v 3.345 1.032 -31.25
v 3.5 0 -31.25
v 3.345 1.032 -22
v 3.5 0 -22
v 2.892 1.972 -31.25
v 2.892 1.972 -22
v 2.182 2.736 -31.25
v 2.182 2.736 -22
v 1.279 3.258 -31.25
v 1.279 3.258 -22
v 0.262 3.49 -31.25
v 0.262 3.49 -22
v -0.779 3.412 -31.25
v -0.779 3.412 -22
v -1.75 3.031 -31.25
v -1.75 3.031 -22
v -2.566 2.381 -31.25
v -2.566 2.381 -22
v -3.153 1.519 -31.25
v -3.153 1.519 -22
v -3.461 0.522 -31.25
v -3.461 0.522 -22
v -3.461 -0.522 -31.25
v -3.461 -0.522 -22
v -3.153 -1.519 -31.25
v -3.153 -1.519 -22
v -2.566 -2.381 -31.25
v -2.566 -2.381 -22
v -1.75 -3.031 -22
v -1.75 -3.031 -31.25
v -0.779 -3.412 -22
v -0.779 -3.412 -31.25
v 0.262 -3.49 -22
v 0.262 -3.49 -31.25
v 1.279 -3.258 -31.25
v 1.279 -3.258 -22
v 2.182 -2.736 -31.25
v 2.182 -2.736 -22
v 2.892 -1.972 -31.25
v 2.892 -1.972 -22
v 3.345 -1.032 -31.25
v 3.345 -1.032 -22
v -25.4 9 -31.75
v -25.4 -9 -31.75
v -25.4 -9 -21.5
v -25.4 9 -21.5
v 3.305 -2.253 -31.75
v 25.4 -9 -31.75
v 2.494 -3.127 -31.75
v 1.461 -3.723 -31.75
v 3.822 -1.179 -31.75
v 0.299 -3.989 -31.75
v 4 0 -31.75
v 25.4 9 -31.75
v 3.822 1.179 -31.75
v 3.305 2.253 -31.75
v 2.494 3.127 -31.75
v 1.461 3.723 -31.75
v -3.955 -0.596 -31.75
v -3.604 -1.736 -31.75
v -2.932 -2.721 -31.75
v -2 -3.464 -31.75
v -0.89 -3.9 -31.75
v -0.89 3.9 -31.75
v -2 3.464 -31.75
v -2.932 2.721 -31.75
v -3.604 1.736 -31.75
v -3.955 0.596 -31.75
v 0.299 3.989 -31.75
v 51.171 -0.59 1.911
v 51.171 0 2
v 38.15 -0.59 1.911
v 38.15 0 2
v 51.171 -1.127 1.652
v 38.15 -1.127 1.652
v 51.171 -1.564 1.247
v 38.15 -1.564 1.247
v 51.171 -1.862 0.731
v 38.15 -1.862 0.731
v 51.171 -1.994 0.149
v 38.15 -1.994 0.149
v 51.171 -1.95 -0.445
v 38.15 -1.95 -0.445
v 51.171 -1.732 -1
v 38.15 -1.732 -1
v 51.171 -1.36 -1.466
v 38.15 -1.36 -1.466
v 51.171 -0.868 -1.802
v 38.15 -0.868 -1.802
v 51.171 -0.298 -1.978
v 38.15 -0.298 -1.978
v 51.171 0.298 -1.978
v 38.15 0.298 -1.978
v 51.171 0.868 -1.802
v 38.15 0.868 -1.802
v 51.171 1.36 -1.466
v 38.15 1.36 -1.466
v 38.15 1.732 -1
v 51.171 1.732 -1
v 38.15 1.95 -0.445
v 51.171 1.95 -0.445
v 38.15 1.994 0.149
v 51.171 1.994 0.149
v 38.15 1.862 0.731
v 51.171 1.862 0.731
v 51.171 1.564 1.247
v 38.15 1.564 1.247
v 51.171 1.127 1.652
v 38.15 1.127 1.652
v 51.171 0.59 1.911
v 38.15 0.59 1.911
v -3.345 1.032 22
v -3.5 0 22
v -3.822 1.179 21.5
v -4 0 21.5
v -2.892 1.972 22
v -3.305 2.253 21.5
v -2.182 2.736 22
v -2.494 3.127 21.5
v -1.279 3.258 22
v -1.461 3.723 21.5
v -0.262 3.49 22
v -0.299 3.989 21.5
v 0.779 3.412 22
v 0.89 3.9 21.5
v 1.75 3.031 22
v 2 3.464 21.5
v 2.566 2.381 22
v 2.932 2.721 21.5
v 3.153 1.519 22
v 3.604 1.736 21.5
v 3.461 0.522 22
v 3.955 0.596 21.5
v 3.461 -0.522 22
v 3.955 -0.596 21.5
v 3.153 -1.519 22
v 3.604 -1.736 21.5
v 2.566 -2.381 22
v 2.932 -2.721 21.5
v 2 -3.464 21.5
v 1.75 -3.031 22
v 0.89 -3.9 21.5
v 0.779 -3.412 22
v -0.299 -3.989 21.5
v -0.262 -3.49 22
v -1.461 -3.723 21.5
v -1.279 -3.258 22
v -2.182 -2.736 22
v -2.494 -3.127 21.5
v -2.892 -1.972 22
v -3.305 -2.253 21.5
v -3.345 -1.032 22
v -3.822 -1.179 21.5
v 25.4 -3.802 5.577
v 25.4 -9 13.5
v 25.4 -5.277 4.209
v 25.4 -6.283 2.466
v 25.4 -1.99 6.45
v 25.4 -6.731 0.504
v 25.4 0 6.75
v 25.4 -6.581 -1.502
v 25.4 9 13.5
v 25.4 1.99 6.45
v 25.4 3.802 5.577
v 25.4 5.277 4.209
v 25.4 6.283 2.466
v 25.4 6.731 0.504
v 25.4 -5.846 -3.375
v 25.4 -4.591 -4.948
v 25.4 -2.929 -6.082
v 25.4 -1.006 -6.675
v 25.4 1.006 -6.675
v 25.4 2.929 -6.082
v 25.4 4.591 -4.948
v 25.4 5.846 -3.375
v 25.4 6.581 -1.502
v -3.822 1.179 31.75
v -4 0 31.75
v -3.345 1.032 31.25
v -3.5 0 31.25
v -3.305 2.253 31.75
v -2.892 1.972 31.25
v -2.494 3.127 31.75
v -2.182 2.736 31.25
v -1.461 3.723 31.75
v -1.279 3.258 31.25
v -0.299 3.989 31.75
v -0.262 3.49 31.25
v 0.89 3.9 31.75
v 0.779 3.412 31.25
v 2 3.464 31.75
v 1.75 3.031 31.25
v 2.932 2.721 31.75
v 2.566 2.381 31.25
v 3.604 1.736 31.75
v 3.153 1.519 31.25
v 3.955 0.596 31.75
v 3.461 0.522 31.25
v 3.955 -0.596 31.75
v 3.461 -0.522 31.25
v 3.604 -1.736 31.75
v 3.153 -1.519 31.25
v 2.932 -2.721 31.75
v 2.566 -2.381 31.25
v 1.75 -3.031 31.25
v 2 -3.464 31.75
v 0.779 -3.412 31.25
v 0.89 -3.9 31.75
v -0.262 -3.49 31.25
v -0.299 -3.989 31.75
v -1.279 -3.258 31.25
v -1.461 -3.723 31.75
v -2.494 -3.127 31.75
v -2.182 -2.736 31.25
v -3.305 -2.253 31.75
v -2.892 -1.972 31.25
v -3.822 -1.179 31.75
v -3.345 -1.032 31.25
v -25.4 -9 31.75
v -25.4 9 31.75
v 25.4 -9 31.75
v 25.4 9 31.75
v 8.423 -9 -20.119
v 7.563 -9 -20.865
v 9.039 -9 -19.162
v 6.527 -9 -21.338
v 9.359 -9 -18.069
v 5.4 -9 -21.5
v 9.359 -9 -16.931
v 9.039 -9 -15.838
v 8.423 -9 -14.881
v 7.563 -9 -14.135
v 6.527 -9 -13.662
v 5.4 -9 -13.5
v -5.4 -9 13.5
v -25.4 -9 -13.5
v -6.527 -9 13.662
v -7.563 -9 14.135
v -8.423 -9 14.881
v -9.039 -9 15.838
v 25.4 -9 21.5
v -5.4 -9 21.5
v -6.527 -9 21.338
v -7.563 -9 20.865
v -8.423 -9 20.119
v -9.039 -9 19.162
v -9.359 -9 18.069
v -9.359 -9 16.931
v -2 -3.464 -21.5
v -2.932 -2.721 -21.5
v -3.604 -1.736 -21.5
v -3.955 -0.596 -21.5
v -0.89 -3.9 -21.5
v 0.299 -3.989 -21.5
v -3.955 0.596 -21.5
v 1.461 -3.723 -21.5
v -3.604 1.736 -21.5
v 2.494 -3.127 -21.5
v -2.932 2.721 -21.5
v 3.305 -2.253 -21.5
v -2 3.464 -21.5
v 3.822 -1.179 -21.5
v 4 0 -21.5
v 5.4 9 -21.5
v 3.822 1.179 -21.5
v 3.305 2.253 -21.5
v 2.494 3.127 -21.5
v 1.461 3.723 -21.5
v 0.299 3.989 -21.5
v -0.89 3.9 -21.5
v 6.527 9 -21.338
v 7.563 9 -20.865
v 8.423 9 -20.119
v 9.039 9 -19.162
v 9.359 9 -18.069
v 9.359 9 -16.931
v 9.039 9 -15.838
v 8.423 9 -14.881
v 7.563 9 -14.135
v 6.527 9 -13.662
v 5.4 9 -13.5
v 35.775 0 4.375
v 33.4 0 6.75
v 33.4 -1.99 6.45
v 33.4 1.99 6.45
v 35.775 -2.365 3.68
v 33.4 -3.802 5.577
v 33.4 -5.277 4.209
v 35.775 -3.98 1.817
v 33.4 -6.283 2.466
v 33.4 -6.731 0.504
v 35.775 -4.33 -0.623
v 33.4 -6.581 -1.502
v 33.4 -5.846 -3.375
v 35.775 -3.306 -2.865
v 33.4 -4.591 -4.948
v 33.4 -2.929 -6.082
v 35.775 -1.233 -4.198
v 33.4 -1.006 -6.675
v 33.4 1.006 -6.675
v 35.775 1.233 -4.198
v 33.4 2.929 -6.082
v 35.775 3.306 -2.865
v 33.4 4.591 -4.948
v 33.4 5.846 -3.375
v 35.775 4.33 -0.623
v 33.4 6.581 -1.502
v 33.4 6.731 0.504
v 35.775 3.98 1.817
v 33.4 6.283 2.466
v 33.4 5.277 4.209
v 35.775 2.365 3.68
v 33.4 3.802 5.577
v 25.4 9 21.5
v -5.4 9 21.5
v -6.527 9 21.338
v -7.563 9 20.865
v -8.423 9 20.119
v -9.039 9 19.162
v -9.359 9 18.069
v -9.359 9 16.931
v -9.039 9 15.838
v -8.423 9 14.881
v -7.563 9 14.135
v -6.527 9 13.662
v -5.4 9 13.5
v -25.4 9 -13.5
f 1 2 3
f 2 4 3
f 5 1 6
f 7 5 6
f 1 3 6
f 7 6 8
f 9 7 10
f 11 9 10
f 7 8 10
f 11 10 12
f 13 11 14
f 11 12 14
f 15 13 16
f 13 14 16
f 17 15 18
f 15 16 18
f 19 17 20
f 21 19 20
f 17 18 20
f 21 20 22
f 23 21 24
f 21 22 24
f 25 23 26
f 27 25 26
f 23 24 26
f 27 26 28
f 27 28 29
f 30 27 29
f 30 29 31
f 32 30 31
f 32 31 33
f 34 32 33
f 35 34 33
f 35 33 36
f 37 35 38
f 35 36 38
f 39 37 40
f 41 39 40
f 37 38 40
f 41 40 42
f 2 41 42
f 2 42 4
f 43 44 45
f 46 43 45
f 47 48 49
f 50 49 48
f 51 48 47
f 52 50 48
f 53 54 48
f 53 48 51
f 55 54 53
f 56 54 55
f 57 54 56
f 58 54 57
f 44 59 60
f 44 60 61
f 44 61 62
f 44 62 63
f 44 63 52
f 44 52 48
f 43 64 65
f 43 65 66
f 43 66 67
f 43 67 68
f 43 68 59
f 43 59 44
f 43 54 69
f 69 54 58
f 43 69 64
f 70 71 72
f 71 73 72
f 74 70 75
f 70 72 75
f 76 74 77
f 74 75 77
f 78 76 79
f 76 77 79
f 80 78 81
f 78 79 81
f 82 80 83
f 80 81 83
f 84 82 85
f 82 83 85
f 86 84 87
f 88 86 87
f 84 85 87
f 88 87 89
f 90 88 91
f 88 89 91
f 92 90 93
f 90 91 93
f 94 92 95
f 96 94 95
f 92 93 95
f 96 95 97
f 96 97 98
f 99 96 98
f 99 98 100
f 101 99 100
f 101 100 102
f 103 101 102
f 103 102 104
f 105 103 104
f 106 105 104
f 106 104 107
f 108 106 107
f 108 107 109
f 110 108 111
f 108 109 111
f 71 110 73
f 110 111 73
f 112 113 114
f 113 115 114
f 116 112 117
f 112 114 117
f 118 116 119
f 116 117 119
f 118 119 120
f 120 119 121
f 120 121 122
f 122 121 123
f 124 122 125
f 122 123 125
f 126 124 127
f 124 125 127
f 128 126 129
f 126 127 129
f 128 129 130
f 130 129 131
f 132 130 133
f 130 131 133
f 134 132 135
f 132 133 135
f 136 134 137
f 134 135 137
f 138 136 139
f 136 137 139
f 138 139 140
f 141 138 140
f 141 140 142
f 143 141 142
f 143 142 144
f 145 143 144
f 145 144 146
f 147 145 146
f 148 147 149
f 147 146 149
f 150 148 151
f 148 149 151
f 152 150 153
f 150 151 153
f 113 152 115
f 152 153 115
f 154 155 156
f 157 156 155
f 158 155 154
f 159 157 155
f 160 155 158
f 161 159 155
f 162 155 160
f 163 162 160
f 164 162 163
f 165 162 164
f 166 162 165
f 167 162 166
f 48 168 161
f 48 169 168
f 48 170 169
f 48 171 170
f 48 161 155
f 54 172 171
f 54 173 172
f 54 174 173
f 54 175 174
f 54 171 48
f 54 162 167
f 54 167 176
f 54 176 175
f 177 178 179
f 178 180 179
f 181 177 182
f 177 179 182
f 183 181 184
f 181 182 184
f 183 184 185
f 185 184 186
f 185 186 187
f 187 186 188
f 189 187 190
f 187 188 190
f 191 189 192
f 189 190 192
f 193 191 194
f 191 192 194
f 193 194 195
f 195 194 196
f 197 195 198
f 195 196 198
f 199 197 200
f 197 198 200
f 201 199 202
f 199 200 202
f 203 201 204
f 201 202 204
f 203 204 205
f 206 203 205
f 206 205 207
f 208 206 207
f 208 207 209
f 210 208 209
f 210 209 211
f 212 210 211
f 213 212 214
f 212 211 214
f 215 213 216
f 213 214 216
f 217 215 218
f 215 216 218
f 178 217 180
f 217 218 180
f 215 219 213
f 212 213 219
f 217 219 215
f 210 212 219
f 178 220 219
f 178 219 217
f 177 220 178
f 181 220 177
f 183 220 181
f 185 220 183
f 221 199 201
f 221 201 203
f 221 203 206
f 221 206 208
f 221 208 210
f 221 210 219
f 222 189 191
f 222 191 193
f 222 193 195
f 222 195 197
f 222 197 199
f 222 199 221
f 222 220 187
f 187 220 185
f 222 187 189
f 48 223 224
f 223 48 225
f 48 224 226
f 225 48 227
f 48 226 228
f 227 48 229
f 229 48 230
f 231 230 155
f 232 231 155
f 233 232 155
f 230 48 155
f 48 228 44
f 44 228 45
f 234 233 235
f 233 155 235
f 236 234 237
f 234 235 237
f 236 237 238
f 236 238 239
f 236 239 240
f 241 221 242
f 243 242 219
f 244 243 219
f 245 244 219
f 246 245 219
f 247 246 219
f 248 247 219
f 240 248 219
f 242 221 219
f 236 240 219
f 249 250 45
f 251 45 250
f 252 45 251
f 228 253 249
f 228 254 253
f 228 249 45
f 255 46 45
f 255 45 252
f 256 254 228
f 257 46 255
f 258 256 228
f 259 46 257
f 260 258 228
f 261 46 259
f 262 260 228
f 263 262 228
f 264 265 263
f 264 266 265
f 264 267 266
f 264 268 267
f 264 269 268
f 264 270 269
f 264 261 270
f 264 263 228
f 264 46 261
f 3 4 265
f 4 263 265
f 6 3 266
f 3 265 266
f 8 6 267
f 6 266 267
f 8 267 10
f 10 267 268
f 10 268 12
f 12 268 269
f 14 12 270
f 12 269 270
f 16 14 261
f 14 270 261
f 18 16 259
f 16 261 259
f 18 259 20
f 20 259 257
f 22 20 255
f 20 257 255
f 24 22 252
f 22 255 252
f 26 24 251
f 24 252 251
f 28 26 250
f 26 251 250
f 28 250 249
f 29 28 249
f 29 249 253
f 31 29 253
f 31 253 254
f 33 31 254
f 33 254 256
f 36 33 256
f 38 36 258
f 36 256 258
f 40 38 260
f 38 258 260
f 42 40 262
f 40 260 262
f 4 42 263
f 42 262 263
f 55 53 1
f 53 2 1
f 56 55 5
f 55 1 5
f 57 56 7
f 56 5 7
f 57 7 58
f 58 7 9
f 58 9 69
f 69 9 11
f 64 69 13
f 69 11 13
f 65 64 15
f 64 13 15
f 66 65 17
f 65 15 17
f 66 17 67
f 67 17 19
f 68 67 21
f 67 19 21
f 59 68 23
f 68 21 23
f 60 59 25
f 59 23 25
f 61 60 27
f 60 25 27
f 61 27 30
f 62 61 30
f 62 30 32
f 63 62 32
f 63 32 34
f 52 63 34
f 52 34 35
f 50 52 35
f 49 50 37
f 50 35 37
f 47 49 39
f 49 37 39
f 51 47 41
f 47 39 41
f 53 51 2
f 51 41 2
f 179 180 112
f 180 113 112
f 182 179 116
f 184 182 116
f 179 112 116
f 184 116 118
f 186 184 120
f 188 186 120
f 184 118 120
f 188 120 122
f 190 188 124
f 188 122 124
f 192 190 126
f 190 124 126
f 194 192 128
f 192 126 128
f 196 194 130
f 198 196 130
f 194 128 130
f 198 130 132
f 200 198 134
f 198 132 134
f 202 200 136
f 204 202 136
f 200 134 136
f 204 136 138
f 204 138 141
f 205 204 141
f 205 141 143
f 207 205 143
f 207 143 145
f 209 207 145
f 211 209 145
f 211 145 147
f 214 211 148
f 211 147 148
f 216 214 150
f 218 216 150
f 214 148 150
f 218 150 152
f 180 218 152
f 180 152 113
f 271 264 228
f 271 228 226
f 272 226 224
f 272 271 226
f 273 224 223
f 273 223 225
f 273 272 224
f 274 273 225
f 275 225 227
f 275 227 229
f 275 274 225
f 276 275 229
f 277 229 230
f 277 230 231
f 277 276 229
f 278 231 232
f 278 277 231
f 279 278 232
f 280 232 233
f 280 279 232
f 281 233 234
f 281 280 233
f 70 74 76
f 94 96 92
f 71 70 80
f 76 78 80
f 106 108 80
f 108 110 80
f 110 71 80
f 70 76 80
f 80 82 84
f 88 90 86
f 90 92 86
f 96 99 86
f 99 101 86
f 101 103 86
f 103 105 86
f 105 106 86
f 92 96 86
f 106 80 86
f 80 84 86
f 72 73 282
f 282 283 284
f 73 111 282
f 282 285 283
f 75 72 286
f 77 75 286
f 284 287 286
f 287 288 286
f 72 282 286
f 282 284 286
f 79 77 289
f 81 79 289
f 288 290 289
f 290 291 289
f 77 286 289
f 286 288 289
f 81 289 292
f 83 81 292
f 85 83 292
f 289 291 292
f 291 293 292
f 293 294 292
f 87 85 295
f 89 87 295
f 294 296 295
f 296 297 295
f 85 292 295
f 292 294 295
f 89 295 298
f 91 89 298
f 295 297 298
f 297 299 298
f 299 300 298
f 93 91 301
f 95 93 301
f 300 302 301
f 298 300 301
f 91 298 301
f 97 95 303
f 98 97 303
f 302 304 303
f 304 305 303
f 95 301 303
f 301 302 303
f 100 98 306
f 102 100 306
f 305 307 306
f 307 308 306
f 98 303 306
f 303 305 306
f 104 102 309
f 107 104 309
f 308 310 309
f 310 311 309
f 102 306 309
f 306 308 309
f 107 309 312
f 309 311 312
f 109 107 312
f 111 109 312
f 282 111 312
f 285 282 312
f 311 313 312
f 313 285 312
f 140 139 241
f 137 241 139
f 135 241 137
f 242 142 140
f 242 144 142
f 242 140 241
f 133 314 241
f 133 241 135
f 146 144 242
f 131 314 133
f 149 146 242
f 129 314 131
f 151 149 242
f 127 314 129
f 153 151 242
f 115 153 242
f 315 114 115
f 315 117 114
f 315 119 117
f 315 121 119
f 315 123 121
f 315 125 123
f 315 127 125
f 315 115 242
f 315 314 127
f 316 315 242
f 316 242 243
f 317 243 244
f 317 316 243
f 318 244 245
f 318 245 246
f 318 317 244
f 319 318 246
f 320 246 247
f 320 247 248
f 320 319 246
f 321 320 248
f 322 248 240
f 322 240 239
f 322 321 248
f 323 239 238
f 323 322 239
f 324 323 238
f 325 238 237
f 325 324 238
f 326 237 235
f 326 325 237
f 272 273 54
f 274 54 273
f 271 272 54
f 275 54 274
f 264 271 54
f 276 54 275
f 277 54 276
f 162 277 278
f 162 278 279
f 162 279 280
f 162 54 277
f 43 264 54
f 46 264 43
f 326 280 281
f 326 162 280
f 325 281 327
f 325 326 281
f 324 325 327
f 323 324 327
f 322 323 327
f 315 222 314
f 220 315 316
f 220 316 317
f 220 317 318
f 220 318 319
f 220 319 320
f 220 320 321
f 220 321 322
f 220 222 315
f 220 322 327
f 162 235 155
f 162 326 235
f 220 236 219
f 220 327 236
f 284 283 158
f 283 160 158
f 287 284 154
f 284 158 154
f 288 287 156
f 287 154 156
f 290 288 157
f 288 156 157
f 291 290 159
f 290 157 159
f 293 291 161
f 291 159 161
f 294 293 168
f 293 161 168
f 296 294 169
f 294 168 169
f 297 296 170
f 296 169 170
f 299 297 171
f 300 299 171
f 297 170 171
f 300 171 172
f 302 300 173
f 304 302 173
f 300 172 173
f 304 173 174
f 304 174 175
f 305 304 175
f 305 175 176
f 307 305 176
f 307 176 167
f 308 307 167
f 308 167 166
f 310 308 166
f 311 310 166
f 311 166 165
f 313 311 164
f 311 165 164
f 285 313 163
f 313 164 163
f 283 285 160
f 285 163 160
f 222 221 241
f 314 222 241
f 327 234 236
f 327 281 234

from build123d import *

# Parameters (mm, degrees)
BOSS_EXTRUDE1_DEPTH = 9
CIRPATTERN1_COUNT   = 2


# Read off the part's stored shape, not the designer's step: M8x1.0 Tapped Hole1
with BuildPart() as part:
    # Sketch1 → Boss-Extrude1 (new, symmetric)
    with BuildSketch(Plane(origin=(0, 0, 0), x_dir=(1, 0, 0), z_dir=(0, 1, 0))):
        with BuildLine():
            Line((-25.4, 0), (25.4, 0))
            Line((25.4, 0), (25.4, 31.75))
            Line((25.4, 31.75), (-25.4, 31.75))
            Line((-25.4, 31.75), (-25.4, 21.5))
            Line((-25.4, 21.5), (5.4, 21.5))
            ThreePointArc((5.4, 21.5), (9.4, 17.5), (5.4, 13.5))
            Line((5.4, 13.5), (-25.4, 13.5))
            Line((-25.4, 13.5), (-25.4, 0))
        make_face()
    boss_extrude1 = extrude(amount=BOSS_EXTRUDE1_DEPTH, both=True)

    # M8x1.0 Tapped Hole1 outline → M8x1.0 Tapped Hole1 (revolve, cut)
    with BuildSketch(Plane.XZ):
        Polygon((4, -21.5), (0, -21.5), (0, -31.75), (4, -31.75), (3.5, -31.25), (3.5, -22), align=None)
    m8x1_0_tapped_hole1 = revolve(axis=Axis((0, 0, 0), (0, 0, 1)), mode=Mode.SUBTRACT)

    # CirPattern1: Boss-Extrude1, M8x1.0 Tapped Hole1 ×2 about axis
    cirpattern1_axis = Axis((0, 0, 0), (0, 1, 0))
    add([boss_extrude1.rotate(cirpattern1_axis, i * 360 / CIRPATTERN1_COUNT) for i in range(1, CIRPATTERN1_COUNT)])
    add([m8x1_0_tapped_hole1.rotate(cirpattern1_axis, i * 360 / CIRPATTERN1_COUNT) for i in range(1, CIRPATTERN1_COUNT)], mode=Mode.SUBTRACT)

    # Sketch5 → Revolve1 (revolve)
    with BuildSketch(Plane(origin=(0, 0, 0), x_dir=(1, 0, 0), z_dir=(0, 1, 0)), mode=Mode.PRIVATE) as revolve1_sk:
        Polygon((25.4, 0), (51.171225178, 0), (51.171225178, 2), (38.15, 2), (33.4, 6.75), (25.4, 6.75), align=None)
    revolve(revolve1_sk.sketch.rotate(Axis((-80.9, 0, 0), (1, 0, 0)), 180), axis=Axis((-80.9, 0, 0), (1, 0, 0)))


solid = part.part
